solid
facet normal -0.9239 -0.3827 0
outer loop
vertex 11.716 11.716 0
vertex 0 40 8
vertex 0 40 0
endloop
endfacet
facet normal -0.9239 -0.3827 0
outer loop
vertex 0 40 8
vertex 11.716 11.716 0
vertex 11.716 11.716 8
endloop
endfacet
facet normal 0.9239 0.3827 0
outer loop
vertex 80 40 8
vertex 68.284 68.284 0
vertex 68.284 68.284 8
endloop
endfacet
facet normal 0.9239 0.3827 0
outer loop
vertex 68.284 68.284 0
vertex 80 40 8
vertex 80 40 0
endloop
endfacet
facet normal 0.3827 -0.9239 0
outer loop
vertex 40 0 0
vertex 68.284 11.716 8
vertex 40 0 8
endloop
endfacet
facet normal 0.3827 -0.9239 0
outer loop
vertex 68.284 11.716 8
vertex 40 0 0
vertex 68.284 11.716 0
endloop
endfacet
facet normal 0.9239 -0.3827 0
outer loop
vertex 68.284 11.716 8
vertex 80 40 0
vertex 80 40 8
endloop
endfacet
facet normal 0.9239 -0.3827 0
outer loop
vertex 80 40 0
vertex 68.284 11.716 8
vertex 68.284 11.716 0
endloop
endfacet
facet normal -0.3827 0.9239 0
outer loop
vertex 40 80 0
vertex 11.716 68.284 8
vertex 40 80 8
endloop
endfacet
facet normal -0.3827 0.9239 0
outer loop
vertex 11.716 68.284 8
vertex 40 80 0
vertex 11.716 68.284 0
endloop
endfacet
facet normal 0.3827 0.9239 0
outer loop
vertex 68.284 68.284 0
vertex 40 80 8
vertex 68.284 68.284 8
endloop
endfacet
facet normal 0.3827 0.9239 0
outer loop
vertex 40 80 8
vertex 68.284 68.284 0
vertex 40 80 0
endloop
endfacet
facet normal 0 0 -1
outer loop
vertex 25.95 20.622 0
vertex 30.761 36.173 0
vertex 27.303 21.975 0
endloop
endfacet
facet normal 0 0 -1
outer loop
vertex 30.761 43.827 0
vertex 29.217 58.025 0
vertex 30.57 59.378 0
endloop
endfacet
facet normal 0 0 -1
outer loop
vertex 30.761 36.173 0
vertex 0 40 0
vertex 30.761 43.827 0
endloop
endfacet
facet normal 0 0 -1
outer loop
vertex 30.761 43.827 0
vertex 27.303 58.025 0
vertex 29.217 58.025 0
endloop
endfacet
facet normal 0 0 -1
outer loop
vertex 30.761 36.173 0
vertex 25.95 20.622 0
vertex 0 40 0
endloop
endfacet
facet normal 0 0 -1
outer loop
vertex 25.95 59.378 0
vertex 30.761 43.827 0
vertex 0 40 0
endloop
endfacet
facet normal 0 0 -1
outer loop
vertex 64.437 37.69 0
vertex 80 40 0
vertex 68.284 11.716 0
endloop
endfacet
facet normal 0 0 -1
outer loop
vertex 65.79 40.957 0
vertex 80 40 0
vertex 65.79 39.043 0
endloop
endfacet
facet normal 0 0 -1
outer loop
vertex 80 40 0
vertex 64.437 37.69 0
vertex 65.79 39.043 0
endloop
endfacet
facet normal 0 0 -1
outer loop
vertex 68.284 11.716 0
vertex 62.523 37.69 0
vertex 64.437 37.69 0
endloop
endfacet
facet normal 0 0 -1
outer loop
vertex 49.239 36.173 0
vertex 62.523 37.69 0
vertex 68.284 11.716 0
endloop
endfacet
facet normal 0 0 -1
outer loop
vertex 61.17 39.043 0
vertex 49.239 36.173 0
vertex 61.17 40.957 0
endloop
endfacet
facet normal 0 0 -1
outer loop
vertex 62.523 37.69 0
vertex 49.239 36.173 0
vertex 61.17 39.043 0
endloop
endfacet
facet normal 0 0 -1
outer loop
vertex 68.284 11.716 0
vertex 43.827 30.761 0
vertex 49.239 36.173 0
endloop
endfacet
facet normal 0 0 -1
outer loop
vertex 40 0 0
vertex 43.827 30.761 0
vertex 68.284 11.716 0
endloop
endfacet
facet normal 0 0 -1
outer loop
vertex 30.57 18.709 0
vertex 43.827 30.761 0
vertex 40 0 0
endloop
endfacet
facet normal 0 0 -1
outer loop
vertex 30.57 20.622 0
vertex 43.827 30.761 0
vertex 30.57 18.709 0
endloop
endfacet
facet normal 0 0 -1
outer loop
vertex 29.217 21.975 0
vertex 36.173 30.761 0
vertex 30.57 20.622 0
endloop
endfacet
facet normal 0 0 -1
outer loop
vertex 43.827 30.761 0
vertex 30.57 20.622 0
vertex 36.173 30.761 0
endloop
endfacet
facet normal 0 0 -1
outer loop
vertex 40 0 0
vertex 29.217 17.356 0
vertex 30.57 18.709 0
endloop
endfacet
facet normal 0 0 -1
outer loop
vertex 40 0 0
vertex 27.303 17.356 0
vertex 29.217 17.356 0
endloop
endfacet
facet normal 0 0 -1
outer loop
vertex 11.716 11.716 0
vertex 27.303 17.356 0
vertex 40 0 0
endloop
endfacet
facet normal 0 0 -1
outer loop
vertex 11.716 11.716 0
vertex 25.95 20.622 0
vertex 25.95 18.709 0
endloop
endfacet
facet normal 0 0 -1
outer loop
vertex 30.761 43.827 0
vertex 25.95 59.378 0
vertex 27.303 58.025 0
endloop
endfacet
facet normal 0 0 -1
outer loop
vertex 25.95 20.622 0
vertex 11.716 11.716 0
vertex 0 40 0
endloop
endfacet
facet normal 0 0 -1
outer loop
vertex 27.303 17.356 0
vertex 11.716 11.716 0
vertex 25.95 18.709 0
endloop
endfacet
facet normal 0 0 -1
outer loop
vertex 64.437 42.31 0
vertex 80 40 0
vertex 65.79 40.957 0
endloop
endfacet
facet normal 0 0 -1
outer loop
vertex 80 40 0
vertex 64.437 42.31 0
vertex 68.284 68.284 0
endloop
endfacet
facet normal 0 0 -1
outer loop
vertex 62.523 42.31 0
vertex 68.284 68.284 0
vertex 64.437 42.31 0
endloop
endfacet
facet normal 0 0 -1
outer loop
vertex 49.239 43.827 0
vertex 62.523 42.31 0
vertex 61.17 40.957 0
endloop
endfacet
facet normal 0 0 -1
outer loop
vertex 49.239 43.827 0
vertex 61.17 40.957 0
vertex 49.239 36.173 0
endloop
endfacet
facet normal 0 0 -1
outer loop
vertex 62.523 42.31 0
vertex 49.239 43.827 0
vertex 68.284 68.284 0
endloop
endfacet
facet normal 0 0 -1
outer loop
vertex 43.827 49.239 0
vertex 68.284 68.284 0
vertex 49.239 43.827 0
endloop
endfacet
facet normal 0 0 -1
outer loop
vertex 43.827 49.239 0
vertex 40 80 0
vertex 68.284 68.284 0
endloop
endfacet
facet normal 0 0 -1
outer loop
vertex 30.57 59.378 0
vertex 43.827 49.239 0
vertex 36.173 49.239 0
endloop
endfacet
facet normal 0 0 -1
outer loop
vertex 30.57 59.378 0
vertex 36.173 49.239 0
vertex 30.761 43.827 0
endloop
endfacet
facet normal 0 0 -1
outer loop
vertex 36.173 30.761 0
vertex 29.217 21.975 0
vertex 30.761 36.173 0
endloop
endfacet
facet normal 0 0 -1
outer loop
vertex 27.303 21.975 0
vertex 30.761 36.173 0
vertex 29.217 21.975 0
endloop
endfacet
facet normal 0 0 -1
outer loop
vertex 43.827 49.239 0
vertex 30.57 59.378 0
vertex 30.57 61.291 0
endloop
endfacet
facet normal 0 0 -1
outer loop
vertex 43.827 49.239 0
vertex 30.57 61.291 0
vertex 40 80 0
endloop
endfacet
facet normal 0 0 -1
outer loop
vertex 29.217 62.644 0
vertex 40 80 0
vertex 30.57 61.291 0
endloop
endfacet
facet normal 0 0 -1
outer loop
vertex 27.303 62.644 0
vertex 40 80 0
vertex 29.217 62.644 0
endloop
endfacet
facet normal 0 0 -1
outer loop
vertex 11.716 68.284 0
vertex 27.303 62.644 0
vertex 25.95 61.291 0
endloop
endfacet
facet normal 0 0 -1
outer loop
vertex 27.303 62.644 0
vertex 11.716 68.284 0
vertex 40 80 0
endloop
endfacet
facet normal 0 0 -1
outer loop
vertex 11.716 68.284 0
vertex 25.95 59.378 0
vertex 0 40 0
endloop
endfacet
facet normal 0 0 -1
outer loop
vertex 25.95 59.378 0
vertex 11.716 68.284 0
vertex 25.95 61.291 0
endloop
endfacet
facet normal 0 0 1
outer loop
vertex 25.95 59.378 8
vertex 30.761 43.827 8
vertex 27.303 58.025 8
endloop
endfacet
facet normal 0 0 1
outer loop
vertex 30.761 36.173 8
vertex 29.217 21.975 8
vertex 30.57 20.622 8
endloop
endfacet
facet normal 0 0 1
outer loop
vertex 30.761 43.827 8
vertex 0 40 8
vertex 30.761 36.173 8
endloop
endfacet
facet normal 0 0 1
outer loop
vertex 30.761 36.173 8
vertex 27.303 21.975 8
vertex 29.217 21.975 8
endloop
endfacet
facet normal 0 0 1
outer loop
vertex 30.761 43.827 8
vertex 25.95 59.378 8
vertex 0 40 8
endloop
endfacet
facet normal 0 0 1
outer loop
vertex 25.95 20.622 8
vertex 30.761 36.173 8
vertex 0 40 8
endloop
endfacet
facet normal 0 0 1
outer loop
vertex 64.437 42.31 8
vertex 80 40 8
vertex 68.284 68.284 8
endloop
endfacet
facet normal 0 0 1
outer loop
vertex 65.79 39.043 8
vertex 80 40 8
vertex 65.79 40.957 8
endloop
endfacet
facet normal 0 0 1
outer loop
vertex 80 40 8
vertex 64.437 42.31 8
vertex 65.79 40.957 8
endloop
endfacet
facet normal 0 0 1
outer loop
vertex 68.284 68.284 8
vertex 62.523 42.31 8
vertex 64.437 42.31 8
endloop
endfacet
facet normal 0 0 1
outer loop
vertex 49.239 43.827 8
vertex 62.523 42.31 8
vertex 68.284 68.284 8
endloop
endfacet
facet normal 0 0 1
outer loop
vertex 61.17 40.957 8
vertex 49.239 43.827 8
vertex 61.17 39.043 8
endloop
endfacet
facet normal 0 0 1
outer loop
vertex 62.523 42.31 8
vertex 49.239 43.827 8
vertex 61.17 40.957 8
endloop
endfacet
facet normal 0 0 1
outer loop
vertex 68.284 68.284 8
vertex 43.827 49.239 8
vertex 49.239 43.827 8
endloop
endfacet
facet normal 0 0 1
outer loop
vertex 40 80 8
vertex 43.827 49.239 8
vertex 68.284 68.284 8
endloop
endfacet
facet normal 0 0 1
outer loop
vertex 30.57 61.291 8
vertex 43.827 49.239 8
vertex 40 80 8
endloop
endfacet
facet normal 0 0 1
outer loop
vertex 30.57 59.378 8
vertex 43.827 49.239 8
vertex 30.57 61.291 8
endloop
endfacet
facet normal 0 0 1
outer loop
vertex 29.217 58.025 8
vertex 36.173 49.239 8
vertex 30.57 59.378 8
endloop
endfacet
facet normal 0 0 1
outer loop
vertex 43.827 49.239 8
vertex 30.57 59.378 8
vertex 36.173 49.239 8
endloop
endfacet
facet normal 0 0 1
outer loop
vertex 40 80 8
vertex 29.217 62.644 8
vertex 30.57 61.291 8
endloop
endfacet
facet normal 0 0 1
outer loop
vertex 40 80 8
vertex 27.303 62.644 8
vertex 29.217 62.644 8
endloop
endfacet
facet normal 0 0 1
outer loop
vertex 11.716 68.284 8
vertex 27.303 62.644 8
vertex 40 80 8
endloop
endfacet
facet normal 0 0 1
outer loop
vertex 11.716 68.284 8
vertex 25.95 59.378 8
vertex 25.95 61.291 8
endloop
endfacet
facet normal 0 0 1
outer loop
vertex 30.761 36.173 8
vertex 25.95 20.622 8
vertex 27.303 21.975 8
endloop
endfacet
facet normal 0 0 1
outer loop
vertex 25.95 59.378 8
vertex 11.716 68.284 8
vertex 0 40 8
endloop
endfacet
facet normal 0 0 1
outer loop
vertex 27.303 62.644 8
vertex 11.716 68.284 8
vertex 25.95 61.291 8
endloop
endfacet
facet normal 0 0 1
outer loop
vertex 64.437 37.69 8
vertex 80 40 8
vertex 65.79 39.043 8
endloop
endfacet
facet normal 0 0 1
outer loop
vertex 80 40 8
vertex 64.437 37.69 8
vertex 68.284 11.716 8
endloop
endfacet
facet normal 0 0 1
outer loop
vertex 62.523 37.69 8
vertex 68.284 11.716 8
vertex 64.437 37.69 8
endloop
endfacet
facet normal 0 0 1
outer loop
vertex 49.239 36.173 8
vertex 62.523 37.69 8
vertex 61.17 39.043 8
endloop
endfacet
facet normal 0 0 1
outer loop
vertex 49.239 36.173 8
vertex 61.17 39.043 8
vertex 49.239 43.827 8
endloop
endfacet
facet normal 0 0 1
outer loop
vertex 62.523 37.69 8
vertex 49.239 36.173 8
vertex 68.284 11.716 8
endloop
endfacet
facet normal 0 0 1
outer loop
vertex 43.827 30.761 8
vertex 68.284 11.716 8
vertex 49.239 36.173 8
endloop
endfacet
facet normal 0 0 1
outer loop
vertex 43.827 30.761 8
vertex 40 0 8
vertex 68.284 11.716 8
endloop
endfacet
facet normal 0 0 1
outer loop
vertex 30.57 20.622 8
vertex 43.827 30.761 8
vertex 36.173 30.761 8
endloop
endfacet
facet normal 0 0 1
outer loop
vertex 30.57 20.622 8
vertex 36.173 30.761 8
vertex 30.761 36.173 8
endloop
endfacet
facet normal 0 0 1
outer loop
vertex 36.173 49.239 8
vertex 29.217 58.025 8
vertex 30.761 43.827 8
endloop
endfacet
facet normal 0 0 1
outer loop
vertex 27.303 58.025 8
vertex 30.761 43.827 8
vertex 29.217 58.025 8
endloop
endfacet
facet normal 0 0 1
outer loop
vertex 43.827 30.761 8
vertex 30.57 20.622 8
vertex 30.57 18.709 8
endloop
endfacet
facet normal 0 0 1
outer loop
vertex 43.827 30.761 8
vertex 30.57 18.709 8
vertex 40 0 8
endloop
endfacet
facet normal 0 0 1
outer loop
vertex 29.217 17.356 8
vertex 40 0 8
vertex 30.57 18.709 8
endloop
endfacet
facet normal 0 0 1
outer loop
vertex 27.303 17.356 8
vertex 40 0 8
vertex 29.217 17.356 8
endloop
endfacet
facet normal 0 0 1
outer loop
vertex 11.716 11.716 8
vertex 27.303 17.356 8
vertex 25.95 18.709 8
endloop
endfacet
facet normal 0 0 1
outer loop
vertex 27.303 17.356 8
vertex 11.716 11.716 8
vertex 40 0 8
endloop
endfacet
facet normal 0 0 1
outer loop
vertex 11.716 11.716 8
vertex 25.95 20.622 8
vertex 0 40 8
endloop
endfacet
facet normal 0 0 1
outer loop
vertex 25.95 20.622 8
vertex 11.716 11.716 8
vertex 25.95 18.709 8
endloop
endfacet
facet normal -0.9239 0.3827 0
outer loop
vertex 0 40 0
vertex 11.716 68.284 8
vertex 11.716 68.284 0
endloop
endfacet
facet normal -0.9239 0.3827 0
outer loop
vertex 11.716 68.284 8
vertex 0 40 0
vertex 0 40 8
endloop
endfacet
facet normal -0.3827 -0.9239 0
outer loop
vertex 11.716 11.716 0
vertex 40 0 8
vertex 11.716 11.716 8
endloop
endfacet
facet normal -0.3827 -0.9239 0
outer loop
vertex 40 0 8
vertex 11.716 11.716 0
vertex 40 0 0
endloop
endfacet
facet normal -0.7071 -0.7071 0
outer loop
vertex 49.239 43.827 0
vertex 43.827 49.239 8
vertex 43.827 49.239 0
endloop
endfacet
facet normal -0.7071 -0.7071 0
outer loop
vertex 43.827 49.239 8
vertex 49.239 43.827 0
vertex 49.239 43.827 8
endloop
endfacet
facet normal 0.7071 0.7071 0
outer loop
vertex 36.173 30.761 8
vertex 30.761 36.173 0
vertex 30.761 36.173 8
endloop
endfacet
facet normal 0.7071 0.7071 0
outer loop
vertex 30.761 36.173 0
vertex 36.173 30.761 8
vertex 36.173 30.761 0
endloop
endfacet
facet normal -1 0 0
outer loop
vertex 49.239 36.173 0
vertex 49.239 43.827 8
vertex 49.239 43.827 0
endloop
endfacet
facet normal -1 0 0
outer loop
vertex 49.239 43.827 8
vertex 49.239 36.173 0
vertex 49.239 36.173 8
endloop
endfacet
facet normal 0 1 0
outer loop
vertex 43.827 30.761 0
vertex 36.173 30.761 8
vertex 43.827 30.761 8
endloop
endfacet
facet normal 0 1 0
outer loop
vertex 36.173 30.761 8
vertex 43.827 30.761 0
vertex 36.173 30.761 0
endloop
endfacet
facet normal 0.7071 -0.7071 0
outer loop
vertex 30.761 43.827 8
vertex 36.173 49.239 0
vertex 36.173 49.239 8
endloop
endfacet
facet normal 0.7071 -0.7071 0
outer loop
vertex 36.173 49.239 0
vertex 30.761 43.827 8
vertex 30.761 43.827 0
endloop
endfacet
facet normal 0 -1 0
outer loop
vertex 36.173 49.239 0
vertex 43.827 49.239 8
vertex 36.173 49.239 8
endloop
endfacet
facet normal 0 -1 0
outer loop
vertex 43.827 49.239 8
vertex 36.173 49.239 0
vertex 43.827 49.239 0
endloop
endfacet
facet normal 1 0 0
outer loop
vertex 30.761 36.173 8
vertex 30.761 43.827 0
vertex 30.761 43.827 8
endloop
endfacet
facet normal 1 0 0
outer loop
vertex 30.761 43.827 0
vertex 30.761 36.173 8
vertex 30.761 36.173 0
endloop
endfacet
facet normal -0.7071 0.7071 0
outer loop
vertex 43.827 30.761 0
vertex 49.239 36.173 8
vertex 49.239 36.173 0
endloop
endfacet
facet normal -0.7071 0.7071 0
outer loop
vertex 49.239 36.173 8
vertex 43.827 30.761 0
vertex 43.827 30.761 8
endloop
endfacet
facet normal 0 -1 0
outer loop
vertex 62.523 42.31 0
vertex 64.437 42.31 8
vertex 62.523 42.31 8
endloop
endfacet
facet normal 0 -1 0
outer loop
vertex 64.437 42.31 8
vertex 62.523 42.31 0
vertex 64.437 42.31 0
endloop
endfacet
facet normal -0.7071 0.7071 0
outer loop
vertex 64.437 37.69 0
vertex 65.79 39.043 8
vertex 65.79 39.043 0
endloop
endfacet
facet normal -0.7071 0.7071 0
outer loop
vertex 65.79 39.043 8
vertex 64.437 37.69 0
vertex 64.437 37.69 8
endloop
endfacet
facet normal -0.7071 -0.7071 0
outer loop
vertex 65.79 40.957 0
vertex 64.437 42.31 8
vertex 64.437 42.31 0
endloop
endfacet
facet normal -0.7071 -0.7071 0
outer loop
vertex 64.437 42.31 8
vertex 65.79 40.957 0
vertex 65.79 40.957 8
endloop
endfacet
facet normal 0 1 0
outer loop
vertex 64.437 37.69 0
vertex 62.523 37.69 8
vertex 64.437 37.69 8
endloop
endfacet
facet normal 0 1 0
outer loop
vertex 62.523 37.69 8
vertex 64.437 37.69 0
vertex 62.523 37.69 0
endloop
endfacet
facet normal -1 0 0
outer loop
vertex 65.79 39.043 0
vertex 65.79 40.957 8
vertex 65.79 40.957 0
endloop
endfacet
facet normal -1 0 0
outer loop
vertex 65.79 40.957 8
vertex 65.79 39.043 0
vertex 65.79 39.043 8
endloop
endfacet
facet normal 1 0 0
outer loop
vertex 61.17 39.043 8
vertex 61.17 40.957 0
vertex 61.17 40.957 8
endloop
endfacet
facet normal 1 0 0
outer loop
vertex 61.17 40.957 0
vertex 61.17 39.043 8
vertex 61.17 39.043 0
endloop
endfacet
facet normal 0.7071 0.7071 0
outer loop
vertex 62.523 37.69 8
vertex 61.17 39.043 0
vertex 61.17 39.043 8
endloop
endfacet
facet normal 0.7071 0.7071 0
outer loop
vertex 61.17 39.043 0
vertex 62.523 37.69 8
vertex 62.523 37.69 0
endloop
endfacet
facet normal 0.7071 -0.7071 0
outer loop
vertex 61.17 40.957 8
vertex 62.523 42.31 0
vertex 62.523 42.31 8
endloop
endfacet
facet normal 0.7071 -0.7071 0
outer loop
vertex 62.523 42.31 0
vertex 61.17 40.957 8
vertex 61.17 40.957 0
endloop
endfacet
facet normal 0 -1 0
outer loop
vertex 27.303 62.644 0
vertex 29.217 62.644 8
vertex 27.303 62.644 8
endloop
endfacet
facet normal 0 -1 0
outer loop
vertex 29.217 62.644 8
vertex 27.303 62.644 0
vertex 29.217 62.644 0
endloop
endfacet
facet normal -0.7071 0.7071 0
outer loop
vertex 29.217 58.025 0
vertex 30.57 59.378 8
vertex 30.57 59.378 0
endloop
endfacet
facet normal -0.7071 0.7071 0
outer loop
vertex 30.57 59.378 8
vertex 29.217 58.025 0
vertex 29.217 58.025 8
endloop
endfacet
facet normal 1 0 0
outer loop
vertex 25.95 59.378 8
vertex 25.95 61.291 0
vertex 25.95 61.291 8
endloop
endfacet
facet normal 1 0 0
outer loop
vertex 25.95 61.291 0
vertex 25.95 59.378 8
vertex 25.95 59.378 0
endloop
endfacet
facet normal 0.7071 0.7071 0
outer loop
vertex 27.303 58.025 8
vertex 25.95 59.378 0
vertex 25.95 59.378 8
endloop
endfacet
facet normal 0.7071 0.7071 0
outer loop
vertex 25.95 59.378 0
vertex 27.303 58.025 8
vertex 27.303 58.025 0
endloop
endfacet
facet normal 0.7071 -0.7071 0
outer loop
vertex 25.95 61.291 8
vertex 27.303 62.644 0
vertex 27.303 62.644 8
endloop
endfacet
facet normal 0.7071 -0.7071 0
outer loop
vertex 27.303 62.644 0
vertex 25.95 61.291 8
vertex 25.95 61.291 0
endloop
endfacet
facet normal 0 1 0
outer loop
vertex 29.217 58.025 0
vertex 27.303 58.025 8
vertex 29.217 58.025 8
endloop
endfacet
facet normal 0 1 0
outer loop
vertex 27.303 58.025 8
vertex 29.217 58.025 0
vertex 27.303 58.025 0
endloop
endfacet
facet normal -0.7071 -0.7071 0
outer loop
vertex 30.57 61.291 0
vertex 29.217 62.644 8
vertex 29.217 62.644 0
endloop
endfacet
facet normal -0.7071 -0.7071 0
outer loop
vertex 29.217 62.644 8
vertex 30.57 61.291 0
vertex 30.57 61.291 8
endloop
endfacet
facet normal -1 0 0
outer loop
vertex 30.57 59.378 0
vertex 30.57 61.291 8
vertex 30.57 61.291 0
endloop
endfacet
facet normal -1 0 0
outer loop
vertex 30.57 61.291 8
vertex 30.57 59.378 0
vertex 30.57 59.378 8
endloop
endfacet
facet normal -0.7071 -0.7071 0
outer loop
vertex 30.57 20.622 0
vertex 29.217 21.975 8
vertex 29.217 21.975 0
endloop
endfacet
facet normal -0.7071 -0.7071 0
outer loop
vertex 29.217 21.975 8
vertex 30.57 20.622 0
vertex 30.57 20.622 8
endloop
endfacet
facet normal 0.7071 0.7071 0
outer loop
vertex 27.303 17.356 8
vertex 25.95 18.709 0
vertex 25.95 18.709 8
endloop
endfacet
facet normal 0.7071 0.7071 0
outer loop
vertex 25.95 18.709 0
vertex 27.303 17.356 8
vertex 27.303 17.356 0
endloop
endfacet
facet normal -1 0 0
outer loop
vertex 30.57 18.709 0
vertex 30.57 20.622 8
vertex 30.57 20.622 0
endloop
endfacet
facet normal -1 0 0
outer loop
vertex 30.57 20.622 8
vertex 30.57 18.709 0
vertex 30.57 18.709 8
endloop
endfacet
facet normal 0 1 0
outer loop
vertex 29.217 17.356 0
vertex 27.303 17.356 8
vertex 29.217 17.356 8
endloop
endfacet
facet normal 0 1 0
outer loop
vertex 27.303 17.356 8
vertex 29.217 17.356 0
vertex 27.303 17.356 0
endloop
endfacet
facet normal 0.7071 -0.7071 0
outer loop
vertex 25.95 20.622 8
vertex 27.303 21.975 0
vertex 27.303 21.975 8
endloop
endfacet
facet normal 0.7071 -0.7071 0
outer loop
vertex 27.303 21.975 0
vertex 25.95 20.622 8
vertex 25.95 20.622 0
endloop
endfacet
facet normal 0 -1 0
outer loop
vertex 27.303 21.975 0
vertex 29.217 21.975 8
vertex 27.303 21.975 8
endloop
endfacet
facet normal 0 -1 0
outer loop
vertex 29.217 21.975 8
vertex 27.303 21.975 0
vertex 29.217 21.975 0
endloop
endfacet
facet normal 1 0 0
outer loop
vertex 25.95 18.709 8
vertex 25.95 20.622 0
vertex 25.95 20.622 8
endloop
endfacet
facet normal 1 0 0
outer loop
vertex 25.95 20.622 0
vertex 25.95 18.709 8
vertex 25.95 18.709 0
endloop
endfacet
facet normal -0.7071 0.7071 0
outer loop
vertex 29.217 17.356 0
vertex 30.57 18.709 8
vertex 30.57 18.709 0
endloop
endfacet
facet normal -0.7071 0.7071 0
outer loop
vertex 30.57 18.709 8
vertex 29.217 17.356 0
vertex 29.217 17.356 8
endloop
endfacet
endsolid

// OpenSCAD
$fn = 32;

// ----------------------------------------------------------------------
// Polygon plate: 8-gon R40, 3 bolt windows
// ----------------------------------------------------------------------

// --- parameters (mm) ---
sides = 8;                // number of polygon sides
plate_r = 40;             // circumscribed radius of the polygon
bore_r = 10;              // centre bore radius
bolts = 3;                // number of bolt windows
ring_r = 23.48;           // bolt-circle radius
bolt_r = 2.5;             // bolt window radius
plate_t = 8;              // plate thickness, Z (extrusion height)

plate_d = 2 * plate_r;  // circumscribed diameter
bore_d = 2 * bore_r;  // centre bore diameter
bolt_d = 2 * bolt_r;  // bolt window diameter
ring_d = 2 * ring_r;  // bolt-circle diameter

profile = [[80, 40], [68.284, 68.284], [40, 80], [11.716, 68.284], [0, 40], [11.716, 11.716], [40, 0], [68.284, 11.716]];  // primary outline, 8 points, counter clockwise
void_1 = [[49.239, 43.827], [43.827, 49.239], [36.173, 49.239], [30.761, 43.827], [30.761, 36.173], [36.173, 30.761], [43.827, 30.761], [49.239, 36.173]];  // centre bore, 8 points
void_2 = [[65.79, 40.957], [64.437, 42.31], [62.523, 42.31], [61.17, 40.957], [61.17, 39.043], [62.523, 37.69], [64.437, 37.69], [65.79, 39.043]];  // bolt window 1, 8 points
void_3 = [[30.57, 61.291], [29.217, 62.644], [27.303, 62.644], [25.95, 61.291], [25.95, 59.378], [27.303, 58.025], [29.217, 58.025], [30.57, 59.378]];  // bolt window 2, 8 points
void_4 = [[30.57, 20.622], [29.217, 21.975], [27.303, 21.975], [25.95, 20.622], [25.95, 18.709], [27.303, 17.356], [29.217, 17.356], [30.57, 18.709]];  // bolt window 3, 8 points

// --- the one profile operation ---
difference() {
  linear_extrude(height = plate_t) polygon(points = profile);
  translate([0, 0, -1])
    linear_extrude(height = plate_t + 2) polygon(points = void_1);
  translate([0, 0, -1])
    linear_extrude(height = plate_t + 2) polygon(points = void_2);
  translate([0, 0, -1])
    linear_extrude(height = plate_t + 2) polygon(points = void_3);
  translate([0, 0, -1])
    linear_extrude(height = plate_t + 2) polygon(points = void_4);
}
